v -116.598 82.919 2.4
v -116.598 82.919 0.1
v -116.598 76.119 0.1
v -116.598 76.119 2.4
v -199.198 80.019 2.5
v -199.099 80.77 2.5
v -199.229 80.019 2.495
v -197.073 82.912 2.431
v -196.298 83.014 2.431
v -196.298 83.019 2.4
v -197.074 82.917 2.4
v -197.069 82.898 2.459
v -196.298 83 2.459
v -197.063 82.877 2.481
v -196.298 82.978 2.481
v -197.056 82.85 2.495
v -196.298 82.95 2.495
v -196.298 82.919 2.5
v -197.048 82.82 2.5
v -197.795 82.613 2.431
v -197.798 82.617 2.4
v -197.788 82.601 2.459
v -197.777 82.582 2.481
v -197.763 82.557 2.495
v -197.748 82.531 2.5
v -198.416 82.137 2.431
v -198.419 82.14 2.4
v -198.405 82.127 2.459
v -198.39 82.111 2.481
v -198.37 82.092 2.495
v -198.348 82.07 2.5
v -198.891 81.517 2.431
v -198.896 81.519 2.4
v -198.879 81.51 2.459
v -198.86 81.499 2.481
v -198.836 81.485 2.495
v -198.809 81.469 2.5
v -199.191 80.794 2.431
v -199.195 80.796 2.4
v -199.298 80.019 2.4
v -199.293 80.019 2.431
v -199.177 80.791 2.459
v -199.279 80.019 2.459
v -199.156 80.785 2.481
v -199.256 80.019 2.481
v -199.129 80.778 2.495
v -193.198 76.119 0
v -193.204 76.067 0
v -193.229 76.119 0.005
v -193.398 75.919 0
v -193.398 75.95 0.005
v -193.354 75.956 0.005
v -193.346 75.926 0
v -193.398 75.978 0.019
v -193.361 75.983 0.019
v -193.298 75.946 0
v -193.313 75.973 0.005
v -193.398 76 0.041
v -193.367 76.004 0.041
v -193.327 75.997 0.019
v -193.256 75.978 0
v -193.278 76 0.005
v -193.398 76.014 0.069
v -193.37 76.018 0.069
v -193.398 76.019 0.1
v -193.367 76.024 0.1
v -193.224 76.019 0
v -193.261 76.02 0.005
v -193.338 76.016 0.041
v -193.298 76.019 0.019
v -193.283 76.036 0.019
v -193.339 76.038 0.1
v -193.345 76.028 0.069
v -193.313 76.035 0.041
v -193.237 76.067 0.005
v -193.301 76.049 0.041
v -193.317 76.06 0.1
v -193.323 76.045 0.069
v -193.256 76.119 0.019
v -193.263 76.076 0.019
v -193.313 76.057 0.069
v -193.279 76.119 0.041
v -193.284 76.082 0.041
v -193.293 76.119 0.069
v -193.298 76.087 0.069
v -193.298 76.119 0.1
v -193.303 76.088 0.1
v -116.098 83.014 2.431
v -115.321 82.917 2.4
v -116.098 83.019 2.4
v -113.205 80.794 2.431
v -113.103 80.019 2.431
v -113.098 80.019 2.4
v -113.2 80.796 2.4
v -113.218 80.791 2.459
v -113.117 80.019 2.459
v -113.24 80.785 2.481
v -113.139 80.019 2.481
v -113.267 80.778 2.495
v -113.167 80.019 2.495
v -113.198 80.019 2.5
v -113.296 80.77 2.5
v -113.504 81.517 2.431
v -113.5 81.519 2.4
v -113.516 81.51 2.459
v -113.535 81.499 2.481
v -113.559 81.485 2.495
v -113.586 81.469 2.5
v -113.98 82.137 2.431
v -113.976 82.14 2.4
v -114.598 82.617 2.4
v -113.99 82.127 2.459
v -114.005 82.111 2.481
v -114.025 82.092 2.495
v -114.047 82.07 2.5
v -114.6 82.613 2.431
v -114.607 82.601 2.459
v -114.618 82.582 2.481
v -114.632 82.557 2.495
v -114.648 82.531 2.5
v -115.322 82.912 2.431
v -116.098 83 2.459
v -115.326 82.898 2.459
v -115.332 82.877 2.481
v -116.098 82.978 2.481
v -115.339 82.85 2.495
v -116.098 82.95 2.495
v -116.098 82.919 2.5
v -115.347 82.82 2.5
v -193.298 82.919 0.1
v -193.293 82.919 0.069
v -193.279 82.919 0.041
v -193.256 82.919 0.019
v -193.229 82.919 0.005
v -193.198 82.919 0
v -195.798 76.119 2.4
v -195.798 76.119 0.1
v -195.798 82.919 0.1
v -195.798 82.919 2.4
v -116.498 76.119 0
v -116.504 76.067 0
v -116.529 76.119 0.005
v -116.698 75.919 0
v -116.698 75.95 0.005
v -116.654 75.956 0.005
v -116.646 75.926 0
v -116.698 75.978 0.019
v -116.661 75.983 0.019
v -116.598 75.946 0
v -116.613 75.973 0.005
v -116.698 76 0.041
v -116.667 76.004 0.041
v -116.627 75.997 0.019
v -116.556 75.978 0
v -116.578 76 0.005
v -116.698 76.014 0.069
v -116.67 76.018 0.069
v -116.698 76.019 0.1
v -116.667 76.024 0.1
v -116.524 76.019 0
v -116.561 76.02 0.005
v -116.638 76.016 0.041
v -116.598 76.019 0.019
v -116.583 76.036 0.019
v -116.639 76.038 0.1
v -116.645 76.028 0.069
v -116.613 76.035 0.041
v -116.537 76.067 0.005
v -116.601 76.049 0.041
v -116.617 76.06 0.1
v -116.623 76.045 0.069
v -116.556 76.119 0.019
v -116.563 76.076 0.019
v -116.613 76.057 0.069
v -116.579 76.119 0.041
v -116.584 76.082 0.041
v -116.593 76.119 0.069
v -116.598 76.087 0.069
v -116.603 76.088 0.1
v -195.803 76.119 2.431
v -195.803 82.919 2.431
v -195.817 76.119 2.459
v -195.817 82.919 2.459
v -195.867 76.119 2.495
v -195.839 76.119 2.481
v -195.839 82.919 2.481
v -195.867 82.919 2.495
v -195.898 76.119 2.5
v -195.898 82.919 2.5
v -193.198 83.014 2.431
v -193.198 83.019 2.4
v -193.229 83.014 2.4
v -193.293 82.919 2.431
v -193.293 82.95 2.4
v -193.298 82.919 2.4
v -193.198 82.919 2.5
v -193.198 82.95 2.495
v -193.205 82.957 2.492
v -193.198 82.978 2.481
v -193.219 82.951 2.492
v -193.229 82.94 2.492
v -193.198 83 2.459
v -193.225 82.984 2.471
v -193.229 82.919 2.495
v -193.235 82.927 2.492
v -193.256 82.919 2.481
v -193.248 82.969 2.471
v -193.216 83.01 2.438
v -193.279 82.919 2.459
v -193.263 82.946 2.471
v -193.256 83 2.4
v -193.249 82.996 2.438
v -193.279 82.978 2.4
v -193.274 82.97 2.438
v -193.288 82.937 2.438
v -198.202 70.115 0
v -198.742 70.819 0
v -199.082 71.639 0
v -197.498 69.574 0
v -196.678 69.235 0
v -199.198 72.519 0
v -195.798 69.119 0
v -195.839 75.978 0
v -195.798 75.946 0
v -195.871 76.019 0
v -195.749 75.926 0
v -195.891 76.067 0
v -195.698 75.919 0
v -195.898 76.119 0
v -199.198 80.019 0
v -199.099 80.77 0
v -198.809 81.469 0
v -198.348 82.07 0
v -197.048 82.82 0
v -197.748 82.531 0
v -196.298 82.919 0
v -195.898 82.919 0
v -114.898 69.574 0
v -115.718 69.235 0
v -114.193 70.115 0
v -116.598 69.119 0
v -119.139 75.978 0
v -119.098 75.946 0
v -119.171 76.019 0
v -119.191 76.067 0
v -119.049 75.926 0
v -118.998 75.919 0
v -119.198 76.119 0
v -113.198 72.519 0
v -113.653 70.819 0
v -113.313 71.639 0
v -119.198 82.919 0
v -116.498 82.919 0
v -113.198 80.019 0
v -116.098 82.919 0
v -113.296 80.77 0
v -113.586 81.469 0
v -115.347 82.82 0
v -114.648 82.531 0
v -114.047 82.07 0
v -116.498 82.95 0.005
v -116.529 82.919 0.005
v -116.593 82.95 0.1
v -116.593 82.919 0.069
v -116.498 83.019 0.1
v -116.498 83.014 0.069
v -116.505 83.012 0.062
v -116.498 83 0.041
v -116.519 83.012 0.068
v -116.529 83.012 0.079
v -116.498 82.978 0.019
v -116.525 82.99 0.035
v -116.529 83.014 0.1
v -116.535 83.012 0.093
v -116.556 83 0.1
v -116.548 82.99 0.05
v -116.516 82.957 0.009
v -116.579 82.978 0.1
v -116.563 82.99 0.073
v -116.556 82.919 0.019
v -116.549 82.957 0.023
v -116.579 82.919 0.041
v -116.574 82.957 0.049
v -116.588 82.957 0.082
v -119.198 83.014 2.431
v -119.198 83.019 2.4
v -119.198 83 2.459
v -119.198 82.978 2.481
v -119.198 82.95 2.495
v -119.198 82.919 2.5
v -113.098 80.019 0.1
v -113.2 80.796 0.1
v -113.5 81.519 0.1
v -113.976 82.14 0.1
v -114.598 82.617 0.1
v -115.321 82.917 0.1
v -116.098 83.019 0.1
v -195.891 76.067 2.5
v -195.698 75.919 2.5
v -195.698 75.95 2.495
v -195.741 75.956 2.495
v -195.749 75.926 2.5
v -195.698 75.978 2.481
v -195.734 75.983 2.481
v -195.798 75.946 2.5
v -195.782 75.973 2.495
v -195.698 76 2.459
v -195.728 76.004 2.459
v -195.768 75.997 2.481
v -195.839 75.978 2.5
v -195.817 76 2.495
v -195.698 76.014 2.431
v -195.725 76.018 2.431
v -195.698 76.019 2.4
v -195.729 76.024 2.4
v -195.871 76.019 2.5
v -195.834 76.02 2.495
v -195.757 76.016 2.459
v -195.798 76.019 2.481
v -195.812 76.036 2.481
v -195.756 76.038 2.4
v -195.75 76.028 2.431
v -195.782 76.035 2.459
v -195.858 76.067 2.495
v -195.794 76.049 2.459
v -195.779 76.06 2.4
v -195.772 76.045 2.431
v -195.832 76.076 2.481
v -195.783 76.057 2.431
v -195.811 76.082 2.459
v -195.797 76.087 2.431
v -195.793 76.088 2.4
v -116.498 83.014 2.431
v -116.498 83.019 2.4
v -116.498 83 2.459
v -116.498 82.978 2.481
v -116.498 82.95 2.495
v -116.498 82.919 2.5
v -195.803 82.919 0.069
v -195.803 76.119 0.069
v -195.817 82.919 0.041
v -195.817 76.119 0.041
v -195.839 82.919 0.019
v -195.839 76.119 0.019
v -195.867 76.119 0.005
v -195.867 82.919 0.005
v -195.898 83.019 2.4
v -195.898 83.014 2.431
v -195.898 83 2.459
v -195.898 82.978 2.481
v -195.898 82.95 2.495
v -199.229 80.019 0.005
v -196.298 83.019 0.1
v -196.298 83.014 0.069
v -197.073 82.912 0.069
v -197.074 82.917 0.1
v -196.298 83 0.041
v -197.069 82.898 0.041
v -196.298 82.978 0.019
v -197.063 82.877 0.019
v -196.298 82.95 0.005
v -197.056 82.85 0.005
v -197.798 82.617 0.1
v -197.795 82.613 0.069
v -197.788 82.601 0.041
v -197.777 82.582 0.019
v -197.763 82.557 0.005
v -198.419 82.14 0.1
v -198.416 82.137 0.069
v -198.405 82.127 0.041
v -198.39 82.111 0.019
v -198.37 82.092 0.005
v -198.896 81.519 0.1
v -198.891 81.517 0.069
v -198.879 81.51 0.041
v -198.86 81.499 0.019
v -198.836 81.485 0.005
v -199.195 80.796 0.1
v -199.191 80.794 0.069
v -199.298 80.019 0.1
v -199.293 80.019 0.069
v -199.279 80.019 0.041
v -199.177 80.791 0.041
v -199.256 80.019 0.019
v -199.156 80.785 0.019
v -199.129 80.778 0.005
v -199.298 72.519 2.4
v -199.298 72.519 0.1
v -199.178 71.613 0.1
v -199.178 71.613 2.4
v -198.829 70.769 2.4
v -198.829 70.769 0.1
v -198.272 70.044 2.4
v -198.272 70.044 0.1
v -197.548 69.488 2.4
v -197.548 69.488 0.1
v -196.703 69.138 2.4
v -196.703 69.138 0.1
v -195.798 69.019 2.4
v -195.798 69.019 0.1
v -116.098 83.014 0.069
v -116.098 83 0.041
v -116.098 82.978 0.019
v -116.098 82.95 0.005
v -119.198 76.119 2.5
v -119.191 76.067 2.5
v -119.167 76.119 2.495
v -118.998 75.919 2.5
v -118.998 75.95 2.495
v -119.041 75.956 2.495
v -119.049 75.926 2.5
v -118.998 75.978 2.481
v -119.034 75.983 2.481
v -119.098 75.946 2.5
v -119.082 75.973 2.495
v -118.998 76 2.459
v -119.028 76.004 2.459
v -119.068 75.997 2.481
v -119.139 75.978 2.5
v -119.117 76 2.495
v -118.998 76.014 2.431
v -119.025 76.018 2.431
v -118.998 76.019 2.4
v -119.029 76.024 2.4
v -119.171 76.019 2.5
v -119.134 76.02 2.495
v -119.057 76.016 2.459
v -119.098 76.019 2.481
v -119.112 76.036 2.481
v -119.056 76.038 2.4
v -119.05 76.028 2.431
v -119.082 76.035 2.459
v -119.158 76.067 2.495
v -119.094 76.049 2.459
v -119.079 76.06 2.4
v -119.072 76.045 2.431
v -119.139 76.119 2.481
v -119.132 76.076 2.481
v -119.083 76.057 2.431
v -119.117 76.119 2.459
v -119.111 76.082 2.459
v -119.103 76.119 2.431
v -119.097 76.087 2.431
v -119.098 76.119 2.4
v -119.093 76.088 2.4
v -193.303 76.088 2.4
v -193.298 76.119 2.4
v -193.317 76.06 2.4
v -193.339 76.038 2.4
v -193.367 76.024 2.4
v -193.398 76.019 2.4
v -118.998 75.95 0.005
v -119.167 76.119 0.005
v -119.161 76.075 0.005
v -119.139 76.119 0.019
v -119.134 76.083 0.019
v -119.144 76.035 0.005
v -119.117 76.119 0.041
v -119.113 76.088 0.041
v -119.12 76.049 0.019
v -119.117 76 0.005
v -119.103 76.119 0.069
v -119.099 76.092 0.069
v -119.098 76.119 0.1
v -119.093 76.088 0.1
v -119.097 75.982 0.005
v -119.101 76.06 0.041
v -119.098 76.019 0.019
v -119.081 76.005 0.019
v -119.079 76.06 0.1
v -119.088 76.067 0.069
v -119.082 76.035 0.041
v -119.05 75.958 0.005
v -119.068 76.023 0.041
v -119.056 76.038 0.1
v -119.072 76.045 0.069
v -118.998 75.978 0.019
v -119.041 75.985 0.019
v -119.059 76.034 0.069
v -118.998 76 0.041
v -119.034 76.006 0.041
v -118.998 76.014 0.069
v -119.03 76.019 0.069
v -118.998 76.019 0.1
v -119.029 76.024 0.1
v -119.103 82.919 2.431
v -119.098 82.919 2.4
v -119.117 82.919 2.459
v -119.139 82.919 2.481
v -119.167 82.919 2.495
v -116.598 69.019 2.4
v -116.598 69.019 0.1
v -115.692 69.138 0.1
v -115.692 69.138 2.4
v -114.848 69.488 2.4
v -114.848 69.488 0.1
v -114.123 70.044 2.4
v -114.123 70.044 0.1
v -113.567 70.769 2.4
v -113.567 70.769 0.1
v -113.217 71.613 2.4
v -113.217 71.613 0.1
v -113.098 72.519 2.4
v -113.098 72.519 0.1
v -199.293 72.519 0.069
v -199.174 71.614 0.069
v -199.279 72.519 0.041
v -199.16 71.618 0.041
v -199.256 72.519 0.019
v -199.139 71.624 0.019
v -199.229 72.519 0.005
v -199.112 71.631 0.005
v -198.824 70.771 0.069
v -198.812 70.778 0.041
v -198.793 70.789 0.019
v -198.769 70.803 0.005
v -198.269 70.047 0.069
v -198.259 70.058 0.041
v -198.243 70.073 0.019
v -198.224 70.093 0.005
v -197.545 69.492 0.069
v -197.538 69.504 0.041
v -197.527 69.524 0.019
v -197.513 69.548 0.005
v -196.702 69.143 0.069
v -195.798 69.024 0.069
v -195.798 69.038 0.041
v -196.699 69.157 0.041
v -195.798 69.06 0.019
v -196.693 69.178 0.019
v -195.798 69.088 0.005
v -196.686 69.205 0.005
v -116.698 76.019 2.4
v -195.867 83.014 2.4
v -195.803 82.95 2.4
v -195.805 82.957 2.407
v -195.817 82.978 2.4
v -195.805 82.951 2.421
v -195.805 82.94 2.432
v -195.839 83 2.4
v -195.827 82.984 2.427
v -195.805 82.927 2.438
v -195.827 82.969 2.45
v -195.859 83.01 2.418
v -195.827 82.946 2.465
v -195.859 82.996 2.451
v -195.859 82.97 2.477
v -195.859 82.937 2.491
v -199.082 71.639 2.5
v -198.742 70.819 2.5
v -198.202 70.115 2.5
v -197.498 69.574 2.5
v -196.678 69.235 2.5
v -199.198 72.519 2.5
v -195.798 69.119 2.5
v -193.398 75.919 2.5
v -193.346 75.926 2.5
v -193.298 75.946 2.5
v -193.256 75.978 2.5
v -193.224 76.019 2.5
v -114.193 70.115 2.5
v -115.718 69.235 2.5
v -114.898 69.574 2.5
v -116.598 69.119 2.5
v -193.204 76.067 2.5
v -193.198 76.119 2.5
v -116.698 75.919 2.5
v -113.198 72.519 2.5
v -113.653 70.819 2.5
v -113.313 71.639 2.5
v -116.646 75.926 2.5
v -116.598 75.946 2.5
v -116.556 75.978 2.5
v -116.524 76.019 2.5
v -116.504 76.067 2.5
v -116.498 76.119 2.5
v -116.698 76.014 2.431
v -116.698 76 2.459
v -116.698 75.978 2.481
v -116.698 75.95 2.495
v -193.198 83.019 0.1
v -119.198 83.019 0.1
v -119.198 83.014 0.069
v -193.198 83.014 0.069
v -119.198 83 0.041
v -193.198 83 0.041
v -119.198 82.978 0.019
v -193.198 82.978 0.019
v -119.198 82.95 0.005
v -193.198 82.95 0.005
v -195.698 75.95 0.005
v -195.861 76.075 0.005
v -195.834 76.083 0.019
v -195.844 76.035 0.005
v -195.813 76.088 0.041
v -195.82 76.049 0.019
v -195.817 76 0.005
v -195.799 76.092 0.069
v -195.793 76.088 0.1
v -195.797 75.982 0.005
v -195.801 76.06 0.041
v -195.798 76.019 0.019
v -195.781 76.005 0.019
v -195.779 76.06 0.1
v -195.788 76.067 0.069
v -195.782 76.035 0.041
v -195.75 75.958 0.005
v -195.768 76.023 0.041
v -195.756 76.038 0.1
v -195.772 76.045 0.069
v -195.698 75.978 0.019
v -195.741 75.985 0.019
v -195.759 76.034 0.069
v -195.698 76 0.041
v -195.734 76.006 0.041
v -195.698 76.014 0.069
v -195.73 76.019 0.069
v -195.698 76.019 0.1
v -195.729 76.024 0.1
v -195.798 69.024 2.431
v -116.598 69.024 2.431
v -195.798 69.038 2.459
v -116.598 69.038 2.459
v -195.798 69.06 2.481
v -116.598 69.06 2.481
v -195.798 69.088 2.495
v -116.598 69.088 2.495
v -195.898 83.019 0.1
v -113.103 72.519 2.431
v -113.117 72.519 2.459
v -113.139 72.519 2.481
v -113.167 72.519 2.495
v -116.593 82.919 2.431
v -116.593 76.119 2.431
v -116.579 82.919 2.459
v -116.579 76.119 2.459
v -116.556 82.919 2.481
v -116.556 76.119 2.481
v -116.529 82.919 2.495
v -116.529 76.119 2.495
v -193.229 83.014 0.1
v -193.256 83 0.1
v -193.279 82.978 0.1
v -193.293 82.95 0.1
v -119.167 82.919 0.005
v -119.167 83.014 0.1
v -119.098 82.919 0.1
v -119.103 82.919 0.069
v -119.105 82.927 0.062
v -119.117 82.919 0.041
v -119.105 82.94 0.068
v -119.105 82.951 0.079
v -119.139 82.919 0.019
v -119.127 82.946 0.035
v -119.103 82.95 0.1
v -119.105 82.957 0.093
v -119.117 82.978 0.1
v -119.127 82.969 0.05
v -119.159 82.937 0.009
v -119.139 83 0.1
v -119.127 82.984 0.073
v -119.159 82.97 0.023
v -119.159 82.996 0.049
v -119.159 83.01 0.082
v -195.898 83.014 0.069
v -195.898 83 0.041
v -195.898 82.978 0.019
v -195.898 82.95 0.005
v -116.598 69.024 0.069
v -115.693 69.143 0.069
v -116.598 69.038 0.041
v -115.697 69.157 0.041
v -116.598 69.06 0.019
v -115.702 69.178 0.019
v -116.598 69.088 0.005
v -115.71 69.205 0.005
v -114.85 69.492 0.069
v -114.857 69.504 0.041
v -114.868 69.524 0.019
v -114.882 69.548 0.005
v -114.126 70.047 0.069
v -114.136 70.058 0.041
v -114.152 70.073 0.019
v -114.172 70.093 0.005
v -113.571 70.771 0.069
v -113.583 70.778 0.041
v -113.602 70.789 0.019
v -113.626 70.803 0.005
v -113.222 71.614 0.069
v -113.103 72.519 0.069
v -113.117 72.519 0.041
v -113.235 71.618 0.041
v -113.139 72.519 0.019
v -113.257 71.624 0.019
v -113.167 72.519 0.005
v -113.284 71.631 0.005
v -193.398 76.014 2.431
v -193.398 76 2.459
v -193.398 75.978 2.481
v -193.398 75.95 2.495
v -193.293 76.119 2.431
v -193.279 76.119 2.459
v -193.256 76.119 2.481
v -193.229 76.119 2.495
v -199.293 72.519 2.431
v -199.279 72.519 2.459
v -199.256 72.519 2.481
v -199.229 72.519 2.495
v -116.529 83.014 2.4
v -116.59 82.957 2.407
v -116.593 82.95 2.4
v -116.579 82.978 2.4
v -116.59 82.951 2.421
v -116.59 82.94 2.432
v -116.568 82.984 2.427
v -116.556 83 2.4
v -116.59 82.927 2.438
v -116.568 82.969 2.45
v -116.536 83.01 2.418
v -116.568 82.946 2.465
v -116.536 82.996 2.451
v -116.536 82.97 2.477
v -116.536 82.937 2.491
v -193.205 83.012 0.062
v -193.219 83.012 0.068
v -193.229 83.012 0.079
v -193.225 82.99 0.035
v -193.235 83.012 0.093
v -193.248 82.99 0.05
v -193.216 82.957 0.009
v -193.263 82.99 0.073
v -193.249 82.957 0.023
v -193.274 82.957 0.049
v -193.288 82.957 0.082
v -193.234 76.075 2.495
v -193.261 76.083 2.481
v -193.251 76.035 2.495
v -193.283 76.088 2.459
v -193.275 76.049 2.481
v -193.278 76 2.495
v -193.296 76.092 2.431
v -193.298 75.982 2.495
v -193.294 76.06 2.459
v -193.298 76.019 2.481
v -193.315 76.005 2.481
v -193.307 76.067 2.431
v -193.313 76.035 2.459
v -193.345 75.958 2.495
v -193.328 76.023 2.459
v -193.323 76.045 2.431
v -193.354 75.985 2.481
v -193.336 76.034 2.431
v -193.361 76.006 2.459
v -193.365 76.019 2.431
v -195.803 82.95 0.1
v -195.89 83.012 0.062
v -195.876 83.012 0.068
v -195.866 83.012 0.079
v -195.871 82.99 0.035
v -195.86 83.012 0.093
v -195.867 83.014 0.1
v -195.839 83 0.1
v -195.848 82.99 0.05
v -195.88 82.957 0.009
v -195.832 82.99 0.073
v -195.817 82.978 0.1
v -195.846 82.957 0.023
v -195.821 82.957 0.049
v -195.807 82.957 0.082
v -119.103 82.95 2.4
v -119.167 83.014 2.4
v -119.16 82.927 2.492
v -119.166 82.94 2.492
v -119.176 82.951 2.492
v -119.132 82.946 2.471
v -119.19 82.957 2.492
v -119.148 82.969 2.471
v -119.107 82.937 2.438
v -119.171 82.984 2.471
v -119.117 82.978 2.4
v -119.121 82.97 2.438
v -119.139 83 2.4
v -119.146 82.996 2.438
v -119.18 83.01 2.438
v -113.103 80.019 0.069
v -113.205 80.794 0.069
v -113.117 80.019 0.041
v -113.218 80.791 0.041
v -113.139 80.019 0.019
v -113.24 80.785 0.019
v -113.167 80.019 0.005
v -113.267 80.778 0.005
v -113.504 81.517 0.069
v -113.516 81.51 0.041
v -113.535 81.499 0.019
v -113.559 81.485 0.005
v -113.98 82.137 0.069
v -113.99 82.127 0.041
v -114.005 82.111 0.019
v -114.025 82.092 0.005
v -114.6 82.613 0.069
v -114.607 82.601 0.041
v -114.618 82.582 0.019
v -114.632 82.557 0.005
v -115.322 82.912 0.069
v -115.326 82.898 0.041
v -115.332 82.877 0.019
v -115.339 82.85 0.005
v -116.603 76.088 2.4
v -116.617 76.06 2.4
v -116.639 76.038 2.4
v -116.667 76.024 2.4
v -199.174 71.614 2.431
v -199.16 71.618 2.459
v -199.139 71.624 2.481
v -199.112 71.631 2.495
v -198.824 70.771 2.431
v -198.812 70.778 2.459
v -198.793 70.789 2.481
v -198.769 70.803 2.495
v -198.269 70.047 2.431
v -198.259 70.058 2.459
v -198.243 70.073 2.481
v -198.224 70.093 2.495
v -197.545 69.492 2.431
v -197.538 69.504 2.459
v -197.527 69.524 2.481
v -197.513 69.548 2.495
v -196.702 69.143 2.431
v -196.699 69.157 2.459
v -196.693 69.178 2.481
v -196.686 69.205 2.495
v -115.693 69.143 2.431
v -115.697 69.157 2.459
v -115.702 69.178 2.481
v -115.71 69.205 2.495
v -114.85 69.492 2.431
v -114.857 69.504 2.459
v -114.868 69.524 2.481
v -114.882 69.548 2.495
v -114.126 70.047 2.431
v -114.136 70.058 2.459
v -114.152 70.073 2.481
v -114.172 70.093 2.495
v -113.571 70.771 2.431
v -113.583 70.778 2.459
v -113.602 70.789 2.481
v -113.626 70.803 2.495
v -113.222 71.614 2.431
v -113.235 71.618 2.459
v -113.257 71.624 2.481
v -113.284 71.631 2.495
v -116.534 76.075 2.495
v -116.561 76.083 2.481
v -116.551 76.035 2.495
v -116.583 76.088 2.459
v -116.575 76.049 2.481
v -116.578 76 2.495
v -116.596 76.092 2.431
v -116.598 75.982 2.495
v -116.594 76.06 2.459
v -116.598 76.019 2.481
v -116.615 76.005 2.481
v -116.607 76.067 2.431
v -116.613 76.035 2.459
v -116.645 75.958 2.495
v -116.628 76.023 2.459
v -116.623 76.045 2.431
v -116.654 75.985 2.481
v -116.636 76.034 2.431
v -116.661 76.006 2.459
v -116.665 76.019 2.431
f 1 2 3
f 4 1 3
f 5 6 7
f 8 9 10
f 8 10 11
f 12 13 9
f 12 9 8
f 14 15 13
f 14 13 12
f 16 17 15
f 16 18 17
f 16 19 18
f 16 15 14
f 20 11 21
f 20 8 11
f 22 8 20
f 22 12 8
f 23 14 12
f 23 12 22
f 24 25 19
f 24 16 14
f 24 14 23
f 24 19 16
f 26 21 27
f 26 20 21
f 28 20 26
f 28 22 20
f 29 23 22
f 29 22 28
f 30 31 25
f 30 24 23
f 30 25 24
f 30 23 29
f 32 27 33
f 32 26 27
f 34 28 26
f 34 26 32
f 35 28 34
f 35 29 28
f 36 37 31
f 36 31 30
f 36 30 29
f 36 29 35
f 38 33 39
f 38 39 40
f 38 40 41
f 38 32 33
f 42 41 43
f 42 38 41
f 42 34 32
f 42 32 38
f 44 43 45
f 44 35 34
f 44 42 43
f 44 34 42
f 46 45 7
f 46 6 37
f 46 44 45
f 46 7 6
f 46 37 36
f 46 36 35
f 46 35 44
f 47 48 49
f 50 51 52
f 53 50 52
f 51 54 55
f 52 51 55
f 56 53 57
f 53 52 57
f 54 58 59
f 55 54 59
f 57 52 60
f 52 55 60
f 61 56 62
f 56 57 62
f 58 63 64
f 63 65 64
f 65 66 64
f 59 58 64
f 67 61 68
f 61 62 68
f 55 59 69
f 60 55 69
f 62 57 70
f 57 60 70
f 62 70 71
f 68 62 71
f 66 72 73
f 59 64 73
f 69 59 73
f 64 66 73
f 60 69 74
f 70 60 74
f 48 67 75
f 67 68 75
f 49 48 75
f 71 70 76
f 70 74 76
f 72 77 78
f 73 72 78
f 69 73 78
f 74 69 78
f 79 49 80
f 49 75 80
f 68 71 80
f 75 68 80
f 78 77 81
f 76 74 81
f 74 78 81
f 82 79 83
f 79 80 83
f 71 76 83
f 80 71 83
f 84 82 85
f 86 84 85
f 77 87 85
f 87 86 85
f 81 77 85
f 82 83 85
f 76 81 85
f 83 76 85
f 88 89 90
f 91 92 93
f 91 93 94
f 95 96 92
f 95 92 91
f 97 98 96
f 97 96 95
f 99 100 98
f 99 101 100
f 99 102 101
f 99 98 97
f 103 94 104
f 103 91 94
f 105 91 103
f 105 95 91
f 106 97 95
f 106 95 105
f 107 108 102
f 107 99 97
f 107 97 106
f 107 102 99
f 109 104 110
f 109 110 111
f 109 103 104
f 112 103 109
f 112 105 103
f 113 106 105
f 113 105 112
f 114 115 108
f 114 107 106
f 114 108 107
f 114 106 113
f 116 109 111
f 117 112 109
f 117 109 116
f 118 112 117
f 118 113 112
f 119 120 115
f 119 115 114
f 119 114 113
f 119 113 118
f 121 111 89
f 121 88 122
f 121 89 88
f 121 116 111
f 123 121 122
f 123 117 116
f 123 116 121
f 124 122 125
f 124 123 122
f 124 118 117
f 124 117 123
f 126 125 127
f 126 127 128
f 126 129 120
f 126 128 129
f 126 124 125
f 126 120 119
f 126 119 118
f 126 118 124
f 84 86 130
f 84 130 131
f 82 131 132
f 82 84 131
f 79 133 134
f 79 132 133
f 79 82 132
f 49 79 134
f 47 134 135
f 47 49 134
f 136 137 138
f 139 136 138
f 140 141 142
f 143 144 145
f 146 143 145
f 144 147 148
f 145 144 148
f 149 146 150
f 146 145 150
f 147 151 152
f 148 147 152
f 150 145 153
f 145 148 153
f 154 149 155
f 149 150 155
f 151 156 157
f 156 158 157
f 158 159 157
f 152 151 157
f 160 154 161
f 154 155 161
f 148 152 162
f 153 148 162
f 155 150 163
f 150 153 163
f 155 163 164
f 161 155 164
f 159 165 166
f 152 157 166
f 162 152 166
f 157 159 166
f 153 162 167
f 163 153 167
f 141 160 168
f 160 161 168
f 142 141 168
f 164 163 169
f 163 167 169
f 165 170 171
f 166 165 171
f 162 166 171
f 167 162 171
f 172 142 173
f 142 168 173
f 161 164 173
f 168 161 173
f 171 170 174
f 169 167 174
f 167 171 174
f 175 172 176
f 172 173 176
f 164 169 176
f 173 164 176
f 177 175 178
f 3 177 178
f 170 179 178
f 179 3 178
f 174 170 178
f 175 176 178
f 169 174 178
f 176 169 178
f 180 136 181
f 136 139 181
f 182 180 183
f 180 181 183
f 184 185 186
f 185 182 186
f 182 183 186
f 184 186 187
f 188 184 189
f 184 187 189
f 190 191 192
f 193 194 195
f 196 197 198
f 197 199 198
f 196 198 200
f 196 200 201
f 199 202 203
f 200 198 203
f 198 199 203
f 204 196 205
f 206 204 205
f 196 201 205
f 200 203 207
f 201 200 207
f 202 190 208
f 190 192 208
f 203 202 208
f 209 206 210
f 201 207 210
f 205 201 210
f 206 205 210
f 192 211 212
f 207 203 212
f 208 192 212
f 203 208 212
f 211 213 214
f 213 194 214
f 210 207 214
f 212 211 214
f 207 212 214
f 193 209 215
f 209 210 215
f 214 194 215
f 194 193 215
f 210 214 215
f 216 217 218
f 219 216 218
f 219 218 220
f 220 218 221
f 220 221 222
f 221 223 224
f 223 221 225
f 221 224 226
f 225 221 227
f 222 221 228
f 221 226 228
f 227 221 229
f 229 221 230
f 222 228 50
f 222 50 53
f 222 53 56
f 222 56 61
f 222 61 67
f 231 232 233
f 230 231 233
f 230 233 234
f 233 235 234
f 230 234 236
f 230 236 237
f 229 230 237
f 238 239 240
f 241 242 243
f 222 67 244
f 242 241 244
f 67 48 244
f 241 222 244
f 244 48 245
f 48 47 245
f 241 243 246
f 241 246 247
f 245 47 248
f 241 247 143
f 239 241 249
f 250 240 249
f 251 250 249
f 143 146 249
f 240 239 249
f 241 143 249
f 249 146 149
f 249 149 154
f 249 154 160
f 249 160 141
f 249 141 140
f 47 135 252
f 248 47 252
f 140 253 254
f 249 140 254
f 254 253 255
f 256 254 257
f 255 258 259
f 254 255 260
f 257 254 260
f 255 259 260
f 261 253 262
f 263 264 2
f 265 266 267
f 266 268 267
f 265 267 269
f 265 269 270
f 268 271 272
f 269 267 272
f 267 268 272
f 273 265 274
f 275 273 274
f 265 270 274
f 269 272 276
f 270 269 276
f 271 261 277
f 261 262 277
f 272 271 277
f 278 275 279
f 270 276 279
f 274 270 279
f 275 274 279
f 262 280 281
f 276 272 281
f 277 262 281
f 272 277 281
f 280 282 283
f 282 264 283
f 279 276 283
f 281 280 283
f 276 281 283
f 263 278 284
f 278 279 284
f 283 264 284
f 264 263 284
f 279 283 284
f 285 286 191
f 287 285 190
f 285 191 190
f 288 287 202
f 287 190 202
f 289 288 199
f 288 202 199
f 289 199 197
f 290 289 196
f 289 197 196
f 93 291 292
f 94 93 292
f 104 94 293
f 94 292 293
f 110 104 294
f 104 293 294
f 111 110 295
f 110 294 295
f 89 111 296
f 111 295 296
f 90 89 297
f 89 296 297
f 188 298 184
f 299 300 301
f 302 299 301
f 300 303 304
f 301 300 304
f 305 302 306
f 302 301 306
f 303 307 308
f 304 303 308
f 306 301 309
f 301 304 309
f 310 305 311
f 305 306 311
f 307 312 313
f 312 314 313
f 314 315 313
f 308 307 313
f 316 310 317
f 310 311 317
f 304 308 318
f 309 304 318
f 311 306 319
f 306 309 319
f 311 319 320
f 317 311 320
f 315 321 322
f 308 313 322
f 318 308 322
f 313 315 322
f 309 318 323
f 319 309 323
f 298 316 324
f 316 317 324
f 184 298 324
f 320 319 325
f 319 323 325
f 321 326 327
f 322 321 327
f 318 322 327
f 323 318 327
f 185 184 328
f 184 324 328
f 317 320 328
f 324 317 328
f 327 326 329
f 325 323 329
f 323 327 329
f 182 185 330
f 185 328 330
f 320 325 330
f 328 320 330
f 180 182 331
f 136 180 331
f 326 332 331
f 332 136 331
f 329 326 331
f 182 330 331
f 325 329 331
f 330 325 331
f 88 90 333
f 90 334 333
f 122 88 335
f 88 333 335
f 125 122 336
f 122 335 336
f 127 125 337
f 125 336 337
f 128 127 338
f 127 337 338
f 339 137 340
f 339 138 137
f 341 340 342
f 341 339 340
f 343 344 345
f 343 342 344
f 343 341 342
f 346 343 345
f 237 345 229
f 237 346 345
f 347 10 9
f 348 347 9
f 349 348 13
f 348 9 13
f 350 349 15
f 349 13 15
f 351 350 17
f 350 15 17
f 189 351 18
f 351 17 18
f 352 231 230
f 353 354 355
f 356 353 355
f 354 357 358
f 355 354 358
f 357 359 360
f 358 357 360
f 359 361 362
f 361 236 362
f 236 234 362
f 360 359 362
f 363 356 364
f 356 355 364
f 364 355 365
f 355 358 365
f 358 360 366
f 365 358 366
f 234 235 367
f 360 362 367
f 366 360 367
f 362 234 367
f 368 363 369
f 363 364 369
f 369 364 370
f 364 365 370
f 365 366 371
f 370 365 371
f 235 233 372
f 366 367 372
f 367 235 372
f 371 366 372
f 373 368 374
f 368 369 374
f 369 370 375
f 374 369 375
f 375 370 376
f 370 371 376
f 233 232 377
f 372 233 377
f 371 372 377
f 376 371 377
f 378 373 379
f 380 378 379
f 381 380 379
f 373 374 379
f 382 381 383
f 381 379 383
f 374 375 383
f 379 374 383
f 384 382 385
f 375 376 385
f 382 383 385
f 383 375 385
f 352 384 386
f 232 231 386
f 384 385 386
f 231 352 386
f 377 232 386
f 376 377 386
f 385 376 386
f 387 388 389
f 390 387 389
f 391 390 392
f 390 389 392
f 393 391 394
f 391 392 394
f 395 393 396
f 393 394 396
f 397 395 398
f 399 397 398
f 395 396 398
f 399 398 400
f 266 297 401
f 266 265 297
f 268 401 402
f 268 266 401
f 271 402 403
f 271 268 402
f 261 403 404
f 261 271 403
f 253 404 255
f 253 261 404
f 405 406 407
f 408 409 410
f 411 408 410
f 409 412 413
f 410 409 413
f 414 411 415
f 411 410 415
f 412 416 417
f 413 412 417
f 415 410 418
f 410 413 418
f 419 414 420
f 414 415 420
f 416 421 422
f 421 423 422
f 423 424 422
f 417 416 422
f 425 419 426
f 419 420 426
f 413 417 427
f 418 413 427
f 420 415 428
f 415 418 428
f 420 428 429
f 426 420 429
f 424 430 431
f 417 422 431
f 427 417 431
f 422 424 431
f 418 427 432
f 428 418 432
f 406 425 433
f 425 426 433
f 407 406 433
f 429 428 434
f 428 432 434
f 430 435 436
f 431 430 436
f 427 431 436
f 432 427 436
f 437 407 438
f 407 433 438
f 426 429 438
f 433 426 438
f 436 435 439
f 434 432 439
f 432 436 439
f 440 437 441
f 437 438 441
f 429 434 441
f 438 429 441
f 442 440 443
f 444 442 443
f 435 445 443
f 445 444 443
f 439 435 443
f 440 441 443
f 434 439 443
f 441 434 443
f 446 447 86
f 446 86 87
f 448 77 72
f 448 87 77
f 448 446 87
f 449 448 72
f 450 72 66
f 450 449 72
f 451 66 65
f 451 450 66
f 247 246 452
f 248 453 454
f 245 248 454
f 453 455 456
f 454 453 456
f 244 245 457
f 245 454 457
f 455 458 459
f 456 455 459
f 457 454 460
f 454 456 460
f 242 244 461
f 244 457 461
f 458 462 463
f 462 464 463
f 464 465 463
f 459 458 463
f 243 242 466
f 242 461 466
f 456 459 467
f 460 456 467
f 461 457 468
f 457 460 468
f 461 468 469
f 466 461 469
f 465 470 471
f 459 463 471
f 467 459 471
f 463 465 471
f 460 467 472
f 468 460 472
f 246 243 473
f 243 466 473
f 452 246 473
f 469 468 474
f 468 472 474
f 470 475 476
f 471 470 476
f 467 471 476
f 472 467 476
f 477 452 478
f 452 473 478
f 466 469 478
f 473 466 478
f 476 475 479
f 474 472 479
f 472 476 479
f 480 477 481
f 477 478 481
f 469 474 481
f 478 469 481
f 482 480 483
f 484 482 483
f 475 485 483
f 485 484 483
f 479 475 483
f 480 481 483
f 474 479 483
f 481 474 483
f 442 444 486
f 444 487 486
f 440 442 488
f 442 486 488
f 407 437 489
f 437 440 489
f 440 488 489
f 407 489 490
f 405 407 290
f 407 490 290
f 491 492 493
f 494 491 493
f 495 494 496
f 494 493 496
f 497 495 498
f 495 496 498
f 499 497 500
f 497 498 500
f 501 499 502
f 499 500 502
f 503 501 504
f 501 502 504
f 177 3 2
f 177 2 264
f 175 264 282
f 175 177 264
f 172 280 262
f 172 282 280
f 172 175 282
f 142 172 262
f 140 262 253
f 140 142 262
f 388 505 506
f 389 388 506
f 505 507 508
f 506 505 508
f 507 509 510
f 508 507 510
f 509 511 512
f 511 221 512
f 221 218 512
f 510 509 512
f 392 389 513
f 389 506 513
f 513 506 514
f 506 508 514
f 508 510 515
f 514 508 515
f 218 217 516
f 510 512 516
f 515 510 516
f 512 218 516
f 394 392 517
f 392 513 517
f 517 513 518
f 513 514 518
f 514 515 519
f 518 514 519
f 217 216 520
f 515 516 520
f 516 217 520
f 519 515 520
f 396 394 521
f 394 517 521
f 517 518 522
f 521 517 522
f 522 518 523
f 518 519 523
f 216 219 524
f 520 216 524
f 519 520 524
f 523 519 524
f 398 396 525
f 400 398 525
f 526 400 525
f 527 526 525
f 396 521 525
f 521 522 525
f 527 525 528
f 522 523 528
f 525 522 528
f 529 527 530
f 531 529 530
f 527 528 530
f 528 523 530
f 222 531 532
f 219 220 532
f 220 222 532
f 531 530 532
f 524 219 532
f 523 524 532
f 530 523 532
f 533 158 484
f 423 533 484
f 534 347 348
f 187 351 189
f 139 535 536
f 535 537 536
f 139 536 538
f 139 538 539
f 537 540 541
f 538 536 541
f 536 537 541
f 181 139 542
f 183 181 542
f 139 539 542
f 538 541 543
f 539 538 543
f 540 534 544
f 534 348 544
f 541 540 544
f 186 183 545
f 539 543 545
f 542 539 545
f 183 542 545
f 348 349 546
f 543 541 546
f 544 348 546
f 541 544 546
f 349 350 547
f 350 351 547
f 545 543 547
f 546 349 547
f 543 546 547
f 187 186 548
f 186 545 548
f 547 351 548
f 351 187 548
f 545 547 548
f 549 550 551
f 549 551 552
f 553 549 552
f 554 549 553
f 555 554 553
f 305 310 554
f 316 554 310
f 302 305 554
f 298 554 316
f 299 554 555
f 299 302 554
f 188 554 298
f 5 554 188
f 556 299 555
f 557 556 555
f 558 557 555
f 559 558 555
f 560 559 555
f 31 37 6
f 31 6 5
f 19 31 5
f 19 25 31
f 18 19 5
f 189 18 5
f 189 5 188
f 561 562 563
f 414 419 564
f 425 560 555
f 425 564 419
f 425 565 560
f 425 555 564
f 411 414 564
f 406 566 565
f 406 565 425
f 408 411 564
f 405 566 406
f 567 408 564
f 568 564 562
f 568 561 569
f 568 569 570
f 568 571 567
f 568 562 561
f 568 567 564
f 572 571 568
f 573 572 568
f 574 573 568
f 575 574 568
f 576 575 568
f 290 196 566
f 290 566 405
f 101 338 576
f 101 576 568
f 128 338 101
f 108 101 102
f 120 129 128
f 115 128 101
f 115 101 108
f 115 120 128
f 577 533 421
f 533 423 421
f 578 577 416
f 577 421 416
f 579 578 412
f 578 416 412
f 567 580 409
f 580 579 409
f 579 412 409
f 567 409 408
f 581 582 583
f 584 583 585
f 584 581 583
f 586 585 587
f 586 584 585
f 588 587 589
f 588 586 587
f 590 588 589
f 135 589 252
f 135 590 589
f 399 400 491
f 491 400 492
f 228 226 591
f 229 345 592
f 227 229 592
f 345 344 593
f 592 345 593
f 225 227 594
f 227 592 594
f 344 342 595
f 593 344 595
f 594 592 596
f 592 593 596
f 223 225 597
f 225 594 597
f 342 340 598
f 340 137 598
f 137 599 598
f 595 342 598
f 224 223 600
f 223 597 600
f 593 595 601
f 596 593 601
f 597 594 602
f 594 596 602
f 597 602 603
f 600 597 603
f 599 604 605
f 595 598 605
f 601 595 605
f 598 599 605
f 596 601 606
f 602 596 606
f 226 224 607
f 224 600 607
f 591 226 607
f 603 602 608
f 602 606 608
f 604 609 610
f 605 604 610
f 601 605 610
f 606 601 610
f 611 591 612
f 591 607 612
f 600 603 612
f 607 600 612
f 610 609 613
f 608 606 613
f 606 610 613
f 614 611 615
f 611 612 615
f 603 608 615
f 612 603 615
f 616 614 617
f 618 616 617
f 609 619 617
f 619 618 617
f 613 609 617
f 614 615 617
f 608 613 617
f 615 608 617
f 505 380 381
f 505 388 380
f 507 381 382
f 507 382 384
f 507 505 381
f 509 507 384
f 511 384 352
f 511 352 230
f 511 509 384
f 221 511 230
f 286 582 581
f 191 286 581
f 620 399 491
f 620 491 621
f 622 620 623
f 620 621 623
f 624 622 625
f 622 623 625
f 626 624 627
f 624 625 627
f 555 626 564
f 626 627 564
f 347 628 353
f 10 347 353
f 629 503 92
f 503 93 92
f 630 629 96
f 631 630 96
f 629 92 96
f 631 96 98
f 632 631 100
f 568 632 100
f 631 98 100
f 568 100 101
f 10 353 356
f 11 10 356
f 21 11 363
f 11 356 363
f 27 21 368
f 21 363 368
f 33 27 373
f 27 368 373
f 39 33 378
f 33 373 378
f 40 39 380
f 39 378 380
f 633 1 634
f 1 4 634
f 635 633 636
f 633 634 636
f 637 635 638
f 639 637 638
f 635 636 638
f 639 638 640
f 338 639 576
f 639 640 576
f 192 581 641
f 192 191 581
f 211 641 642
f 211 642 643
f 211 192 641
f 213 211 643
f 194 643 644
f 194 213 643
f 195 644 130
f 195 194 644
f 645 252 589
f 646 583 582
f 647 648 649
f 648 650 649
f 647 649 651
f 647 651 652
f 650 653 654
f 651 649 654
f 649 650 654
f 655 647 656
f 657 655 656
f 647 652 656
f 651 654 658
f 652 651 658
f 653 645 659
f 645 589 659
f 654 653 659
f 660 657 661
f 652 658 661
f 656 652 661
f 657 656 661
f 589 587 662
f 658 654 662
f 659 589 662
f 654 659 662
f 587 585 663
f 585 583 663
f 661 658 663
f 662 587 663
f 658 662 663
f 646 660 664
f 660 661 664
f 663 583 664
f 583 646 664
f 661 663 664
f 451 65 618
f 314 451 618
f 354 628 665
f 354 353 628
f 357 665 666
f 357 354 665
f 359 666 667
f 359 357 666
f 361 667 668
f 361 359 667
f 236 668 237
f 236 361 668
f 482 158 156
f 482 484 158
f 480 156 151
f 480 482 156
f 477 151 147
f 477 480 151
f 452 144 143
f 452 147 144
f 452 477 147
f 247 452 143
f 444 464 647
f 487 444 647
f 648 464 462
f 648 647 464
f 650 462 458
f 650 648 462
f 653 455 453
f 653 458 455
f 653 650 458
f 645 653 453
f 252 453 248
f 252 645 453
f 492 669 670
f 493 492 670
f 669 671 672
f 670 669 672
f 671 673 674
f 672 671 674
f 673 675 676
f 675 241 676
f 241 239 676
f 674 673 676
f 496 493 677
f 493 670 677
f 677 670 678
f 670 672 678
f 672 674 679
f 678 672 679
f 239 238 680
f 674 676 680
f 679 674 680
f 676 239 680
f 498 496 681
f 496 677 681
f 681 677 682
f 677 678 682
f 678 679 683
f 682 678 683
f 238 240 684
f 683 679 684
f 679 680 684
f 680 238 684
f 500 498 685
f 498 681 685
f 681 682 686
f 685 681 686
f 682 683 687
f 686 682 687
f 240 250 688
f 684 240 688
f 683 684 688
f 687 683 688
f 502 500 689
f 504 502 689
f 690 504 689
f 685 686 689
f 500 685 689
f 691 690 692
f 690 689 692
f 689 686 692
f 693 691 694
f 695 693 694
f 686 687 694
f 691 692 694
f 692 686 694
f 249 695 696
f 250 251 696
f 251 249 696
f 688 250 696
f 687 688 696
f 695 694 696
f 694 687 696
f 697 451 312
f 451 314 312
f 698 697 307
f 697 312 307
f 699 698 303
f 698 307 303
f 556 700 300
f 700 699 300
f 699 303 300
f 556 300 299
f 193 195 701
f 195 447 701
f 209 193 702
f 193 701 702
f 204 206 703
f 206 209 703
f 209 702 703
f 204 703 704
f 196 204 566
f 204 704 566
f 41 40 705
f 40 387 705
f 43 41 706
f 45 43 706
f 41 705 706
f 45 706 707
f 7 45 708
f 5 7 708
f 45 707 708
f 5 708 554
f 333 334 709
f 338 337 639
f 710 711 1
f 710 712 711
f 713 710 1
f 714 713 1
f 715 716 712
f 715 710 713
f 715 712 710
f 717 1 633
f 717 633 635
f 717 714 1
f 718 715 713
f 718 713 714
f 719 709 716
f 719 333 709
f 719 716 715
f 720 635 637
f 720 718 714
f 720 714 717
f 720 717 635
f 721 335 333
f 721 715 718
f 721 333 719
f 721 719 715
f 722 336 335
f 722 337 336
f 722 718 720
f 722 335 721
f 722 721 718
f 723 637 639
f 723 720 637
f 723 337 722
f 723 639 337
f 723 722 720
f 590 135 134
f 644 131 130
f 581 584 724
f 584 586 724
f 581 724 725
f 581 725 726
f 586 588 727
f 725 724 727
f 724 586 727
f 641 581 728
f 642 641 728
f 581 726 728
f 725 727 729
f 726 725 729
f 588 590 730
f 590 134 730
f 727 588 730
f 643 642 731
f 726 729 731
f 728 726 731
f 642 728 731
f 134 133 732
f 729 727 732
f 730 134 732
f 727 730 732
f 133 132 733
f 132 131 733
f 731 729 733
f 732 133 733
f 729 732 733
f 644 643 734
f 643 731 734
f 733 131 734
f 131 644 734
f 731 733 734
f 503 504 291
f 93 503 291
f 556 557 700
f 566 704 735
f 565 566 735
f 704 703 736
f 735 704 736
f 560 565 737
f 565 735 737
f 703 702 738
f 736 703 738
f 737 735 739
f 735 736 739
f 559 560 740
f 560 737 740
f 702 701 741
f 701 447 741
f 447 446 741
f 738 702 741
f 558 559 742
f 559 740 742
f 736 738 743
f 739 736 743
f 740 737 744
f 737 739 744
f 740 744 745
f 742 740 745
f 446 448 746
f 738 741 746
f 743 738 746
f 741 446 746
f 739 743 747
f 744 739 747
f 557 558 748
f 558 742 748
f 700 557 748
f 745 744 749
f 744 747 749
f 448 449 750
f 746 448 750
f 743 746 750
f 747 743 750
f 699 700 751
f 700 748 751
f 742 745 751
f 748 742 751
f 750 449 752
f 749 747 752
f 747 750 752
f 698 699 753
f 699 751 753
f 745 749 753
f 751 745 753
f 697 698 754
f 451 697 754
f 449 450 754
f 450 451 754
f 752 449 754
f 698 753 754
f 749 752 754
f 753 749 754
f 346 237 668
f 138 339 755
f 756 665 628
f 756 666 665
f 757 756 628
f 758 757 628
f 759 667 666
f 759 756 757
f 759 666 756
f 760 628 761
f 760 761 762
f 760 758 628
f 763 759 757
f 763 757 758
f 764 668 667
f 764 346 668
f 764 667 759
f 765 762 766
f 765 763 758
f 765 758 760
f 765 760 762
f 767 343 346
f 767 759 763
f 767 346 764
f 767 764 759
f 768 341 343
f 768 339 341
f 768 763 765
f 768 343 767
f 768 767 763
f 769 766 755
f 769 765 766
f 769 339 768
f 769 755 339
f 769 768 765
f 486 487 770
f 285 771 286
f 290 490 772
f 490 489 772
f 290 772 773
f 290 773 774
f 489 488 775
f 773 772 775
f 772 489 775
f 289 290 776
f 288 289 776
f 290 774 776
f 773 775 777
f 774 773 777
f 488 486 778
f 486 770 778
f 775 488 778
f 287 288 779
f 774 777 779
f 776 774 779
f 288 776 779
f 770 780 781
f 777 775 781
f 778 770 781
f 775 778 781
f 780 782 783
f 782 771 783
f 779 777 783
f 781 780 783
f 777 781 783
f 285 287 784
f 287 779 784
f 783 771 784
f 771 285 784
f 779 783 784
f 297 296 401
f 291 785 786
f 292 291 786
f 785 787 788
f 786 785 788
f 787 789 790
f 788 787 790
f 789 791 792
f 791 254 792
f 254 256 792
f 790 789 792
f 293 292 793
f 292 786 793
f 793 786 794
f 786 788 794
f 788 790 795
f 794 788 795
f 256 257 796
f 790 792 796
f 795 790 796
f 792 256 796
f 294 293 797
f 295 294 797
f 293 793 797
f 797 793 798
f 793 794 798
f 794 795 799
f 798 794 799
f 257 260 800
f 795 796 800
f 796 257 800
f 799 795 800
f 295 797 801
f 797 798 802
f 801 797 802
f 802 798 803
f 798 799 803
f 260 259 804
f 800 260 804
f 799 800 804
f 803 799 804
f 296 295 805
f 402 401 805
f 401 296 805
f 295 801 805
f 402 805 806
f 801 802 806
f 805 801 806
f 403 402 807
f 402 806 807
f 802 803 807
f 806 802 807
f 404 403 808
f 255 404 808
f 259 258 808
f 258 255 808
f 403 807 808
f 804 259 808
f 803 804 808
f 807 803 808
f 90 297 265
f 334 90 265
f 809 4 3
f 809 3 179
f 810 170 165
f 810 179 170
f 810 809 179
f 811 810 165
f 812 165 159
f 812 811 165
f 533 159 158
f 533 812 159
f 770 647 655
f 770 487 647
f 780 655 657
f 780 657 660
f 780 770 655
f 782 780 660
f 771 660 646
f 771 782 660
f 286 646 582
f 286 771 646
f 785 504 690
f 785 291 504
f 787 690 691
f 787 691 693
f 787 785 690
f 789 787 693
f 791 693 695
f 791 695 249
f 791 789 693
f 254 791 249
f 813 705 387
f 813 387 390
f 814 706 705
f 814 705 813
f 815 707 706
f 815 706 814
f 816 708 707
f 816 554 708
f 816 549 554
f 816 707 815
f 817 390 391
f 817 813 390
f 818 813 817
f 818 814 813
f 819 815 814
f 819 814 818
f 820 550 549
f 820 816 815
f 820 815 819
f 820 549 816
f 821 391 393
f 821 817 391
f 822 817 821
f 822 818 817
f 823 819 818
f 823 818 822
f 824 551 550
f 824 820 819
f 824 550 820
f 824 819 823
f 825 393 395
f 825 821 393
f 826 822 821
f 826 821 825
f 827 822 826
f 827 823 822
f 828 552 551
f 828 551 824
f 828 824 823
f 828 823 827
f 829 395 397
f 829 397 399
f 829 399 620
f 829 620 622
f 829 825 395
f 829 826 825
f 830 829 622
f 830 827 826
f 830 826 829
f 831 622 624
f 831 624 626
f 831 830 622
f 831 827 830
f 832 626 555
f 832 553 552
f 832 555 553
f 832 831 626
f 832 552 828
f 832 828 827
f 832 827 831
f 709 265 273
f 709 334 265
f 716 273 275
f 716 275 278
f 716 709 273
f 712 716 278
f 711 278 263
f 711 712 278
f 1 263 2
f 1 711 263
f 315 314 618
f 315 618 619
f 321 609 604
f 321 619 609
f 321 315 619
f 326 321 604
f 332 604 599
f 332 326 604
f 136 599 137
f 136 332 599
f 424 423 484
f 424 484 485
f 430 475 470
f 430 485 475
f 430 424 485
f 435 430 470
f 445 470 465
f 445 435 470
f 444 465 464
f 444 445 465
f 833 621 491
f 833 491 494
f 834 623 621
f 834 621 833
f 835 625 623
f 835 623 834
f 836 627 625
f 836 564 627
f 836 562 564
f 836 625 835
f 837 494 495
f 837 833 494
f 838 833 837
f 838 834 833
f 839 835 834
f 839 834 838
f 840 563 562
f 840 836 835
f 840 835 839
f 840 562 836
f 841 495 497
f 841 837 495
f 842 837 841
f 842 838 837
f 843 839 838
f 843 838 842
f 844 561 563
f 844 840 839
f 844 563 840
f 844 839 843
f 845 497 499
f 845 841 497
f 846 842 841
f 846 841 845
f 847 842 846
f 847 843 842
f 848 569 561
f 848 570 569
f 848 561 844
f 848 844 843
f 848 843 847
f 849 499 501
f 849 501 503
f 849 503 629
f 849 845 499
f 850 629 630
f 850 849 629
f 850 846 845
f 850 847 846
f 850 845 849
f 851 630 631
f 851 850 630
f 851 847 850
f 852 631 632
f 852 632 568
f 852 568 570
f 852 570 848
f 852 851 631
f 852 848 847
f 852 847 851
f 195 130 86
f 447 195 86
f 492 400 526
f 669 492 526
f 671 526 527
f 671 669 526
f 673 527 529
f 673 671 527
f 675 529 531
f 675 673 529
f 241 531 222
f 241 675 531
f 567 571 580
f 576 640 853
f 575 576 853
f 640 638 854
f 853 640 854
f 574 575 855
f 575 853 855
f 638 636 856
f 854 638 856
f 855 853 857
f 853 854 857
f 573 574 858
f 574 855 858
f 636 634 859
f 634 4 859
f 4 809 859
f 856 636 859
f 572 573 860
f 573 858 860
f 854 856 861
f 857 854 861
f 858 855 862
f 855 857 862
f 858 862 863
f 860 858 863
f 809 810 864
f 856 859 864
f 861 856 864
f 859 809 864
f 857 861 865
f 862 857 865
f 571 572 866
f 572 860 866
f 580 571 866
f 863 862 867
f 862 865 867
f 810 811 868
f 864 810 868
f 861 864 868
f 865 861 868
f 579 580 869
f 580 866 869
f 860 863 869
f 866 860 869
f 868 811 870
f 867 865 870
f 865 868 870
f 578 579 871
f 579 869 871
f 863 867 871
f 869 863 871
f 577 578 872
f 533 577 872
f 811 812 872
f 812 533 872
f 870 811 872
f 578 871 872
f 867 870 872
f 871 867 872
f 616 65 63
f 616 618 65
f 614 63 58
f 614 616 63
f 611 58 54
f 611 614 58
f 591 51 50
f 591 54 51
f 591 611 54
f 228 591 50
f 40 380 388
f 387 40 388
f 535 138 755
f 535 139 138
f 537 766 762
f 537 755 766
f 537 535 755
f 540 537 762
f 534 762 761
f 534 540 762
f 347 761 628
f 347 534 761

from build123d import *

# Parameters (mm, degrees)
RESSALTO_EXTRUS_O1_DEPTH = 2.5
FILETE1_R                = 0.1


with BuildPart() as part:
    # Esboço1 → Ressalto-extrusão1 (new body)
    with BuildSketch(Plane.XY):
        with BuildLine():
            ThreePointArc((-199.297641475, 72.518779678), (-198.272493356, 70.044033295), (-195.797641475, 69.019139891))
            Line((-195.797641475, 69.019139891), (-116.597641475, 69.019139891))
            ThreePointArc((-116.597641475, 69.019139891), (-114.122789593, 70.044033295), (-113.097641475, 72.518779678))
            Line((-113.097641475, 72.518779678), (-113.097641475, 80.019139873))
            ThreePointArc((-113.097641475, 80.019139873), (-113.976321131, 82.140460216), (-116.097641475, 83.019139873))
            Line((-116.097641475, 83.019139873), (-116.597641475, 83.019139873))
            Line((-116.597641475, 83.019139873), (-116.597641475, 76.019139873))
            Line((-116.597641475, 76.019139873), (-119.097641475, 76.019139873))
            Line((-119.097641475, 76.019139873), (-119.097641475, 83.019139873))
            Line((-119.097641475, 83.019139873), (-135.097641475, 83.019139873))
            Line((-135.097641475, 83.019139873), (-141.097641475, 83.019139873))
            Line((-141.097641475, 83.019139873), (-171.297641475, 83.019139873))
            Line((-171.297641475, 83.019139873), (-177.297641475, 83.019139873))
            Line((-177.297641475, 83.019139873), (-193.297641475, 83.019139873))
            Line((-193.297641475, 83.019139873), (-193.297641475, 76.019139873))
            Line((-193.297641475, 76.019139873), (-195.797641475, 76.019139873))
            Line((-195.797641475, 76.019139873), (-195.797641475, 83.019139873))
            Line((-195.797641475, 83.019139873), (-196.297641475, 83.019139873))
            ThreePointArc((-196.297641475, 83.019139873), (-198.418961818, 82.140460216), (-199.297641475, 80.019139873))
            Line((-199.297641475, 80.019139873), (-199.297641475, 72.518779678))
        make_face()
    extrude(amount=RESSALTO_EXTRUS_O1_DEPTH)

    # Filete1
    filete1_edges = [part.edges().sort_by_distance(p)[0] for p in [
        (-199.297641475, 76.268959775, 2.5),
        (-195.797641475, 79.519139873, 0),
        (-194.547641475, 76.019139873, 0),
        (-198.272493356, 70.044033295, 2.5),
        (-193.297641475, 79.519139873, 0),
        (-156.197641475, 83.019139873, 0),
        (-119.097641475, 79.519139873, 0),
        (-117.847641475, 76.019139873, 0),
        (-116.597641475, 79.519139873, 0),
        (-116.347641475, 83.019139873, 0),
        (-113.976321131, 82.140460216, 0),
        (-113.097641475, 76.268959775, 0),
        (-156.197641475, 69.019139891, 2.5),
        (-114.122789593, 70.044033295, 0),
        (-156.197641475, 69.019139891, 0),
        (-198.272493356, 70.044033295, 0),
        (-199.297641475, 76.268959775, 0),
        (-198.418961818, 82.140460216, 0),
        (-196.047641475, 83.019139873, 0),
        (-114.122789593, 70.044033295, 2.5),
        (-113.097641475, 76.268959775, 2.5),
        (-195.797641475, 83.019139873, 1.25),
        (-195.797641475, 76.019139873, 1.25),
        (-193.297641475, 76.019139873, 1.25),
        (-193.297641475, 83.019139873, 1.25),
        (-119.097641475, 83.019139873, 1.25),
        (-119.097641475, 76.019139873, 1.25),
        (-116.597641475, 76.019139873, 1.25),
        (-116.597641475, 83.019139873, 1.25),
        (-113.976321131, 82.140460216, 2.5),
        (-116.347641475, 83.019139873, 2.5),
        (-116.597641475, 79.519139873, 2.5),
        (-117.847641475, 76.019139873, 2.5),
        (-119.097641475, 79.519139873, 2.5),
        (-196.047641475, 83.019139873, 2.5),
        (-156.197641475, 83.019139873, 2.5),
        (-193.297641475, 79.519139873, 2.5),
        (-194.547641475, 76.019139873, 2.5),
        (-195.797641475, 79.519139873, 2.5),
        (-198.418961818, 82.140460216, 2.5),
    ]]
    fillet(filete1_edges, radius=FILETE1_R)


solid = part.part
